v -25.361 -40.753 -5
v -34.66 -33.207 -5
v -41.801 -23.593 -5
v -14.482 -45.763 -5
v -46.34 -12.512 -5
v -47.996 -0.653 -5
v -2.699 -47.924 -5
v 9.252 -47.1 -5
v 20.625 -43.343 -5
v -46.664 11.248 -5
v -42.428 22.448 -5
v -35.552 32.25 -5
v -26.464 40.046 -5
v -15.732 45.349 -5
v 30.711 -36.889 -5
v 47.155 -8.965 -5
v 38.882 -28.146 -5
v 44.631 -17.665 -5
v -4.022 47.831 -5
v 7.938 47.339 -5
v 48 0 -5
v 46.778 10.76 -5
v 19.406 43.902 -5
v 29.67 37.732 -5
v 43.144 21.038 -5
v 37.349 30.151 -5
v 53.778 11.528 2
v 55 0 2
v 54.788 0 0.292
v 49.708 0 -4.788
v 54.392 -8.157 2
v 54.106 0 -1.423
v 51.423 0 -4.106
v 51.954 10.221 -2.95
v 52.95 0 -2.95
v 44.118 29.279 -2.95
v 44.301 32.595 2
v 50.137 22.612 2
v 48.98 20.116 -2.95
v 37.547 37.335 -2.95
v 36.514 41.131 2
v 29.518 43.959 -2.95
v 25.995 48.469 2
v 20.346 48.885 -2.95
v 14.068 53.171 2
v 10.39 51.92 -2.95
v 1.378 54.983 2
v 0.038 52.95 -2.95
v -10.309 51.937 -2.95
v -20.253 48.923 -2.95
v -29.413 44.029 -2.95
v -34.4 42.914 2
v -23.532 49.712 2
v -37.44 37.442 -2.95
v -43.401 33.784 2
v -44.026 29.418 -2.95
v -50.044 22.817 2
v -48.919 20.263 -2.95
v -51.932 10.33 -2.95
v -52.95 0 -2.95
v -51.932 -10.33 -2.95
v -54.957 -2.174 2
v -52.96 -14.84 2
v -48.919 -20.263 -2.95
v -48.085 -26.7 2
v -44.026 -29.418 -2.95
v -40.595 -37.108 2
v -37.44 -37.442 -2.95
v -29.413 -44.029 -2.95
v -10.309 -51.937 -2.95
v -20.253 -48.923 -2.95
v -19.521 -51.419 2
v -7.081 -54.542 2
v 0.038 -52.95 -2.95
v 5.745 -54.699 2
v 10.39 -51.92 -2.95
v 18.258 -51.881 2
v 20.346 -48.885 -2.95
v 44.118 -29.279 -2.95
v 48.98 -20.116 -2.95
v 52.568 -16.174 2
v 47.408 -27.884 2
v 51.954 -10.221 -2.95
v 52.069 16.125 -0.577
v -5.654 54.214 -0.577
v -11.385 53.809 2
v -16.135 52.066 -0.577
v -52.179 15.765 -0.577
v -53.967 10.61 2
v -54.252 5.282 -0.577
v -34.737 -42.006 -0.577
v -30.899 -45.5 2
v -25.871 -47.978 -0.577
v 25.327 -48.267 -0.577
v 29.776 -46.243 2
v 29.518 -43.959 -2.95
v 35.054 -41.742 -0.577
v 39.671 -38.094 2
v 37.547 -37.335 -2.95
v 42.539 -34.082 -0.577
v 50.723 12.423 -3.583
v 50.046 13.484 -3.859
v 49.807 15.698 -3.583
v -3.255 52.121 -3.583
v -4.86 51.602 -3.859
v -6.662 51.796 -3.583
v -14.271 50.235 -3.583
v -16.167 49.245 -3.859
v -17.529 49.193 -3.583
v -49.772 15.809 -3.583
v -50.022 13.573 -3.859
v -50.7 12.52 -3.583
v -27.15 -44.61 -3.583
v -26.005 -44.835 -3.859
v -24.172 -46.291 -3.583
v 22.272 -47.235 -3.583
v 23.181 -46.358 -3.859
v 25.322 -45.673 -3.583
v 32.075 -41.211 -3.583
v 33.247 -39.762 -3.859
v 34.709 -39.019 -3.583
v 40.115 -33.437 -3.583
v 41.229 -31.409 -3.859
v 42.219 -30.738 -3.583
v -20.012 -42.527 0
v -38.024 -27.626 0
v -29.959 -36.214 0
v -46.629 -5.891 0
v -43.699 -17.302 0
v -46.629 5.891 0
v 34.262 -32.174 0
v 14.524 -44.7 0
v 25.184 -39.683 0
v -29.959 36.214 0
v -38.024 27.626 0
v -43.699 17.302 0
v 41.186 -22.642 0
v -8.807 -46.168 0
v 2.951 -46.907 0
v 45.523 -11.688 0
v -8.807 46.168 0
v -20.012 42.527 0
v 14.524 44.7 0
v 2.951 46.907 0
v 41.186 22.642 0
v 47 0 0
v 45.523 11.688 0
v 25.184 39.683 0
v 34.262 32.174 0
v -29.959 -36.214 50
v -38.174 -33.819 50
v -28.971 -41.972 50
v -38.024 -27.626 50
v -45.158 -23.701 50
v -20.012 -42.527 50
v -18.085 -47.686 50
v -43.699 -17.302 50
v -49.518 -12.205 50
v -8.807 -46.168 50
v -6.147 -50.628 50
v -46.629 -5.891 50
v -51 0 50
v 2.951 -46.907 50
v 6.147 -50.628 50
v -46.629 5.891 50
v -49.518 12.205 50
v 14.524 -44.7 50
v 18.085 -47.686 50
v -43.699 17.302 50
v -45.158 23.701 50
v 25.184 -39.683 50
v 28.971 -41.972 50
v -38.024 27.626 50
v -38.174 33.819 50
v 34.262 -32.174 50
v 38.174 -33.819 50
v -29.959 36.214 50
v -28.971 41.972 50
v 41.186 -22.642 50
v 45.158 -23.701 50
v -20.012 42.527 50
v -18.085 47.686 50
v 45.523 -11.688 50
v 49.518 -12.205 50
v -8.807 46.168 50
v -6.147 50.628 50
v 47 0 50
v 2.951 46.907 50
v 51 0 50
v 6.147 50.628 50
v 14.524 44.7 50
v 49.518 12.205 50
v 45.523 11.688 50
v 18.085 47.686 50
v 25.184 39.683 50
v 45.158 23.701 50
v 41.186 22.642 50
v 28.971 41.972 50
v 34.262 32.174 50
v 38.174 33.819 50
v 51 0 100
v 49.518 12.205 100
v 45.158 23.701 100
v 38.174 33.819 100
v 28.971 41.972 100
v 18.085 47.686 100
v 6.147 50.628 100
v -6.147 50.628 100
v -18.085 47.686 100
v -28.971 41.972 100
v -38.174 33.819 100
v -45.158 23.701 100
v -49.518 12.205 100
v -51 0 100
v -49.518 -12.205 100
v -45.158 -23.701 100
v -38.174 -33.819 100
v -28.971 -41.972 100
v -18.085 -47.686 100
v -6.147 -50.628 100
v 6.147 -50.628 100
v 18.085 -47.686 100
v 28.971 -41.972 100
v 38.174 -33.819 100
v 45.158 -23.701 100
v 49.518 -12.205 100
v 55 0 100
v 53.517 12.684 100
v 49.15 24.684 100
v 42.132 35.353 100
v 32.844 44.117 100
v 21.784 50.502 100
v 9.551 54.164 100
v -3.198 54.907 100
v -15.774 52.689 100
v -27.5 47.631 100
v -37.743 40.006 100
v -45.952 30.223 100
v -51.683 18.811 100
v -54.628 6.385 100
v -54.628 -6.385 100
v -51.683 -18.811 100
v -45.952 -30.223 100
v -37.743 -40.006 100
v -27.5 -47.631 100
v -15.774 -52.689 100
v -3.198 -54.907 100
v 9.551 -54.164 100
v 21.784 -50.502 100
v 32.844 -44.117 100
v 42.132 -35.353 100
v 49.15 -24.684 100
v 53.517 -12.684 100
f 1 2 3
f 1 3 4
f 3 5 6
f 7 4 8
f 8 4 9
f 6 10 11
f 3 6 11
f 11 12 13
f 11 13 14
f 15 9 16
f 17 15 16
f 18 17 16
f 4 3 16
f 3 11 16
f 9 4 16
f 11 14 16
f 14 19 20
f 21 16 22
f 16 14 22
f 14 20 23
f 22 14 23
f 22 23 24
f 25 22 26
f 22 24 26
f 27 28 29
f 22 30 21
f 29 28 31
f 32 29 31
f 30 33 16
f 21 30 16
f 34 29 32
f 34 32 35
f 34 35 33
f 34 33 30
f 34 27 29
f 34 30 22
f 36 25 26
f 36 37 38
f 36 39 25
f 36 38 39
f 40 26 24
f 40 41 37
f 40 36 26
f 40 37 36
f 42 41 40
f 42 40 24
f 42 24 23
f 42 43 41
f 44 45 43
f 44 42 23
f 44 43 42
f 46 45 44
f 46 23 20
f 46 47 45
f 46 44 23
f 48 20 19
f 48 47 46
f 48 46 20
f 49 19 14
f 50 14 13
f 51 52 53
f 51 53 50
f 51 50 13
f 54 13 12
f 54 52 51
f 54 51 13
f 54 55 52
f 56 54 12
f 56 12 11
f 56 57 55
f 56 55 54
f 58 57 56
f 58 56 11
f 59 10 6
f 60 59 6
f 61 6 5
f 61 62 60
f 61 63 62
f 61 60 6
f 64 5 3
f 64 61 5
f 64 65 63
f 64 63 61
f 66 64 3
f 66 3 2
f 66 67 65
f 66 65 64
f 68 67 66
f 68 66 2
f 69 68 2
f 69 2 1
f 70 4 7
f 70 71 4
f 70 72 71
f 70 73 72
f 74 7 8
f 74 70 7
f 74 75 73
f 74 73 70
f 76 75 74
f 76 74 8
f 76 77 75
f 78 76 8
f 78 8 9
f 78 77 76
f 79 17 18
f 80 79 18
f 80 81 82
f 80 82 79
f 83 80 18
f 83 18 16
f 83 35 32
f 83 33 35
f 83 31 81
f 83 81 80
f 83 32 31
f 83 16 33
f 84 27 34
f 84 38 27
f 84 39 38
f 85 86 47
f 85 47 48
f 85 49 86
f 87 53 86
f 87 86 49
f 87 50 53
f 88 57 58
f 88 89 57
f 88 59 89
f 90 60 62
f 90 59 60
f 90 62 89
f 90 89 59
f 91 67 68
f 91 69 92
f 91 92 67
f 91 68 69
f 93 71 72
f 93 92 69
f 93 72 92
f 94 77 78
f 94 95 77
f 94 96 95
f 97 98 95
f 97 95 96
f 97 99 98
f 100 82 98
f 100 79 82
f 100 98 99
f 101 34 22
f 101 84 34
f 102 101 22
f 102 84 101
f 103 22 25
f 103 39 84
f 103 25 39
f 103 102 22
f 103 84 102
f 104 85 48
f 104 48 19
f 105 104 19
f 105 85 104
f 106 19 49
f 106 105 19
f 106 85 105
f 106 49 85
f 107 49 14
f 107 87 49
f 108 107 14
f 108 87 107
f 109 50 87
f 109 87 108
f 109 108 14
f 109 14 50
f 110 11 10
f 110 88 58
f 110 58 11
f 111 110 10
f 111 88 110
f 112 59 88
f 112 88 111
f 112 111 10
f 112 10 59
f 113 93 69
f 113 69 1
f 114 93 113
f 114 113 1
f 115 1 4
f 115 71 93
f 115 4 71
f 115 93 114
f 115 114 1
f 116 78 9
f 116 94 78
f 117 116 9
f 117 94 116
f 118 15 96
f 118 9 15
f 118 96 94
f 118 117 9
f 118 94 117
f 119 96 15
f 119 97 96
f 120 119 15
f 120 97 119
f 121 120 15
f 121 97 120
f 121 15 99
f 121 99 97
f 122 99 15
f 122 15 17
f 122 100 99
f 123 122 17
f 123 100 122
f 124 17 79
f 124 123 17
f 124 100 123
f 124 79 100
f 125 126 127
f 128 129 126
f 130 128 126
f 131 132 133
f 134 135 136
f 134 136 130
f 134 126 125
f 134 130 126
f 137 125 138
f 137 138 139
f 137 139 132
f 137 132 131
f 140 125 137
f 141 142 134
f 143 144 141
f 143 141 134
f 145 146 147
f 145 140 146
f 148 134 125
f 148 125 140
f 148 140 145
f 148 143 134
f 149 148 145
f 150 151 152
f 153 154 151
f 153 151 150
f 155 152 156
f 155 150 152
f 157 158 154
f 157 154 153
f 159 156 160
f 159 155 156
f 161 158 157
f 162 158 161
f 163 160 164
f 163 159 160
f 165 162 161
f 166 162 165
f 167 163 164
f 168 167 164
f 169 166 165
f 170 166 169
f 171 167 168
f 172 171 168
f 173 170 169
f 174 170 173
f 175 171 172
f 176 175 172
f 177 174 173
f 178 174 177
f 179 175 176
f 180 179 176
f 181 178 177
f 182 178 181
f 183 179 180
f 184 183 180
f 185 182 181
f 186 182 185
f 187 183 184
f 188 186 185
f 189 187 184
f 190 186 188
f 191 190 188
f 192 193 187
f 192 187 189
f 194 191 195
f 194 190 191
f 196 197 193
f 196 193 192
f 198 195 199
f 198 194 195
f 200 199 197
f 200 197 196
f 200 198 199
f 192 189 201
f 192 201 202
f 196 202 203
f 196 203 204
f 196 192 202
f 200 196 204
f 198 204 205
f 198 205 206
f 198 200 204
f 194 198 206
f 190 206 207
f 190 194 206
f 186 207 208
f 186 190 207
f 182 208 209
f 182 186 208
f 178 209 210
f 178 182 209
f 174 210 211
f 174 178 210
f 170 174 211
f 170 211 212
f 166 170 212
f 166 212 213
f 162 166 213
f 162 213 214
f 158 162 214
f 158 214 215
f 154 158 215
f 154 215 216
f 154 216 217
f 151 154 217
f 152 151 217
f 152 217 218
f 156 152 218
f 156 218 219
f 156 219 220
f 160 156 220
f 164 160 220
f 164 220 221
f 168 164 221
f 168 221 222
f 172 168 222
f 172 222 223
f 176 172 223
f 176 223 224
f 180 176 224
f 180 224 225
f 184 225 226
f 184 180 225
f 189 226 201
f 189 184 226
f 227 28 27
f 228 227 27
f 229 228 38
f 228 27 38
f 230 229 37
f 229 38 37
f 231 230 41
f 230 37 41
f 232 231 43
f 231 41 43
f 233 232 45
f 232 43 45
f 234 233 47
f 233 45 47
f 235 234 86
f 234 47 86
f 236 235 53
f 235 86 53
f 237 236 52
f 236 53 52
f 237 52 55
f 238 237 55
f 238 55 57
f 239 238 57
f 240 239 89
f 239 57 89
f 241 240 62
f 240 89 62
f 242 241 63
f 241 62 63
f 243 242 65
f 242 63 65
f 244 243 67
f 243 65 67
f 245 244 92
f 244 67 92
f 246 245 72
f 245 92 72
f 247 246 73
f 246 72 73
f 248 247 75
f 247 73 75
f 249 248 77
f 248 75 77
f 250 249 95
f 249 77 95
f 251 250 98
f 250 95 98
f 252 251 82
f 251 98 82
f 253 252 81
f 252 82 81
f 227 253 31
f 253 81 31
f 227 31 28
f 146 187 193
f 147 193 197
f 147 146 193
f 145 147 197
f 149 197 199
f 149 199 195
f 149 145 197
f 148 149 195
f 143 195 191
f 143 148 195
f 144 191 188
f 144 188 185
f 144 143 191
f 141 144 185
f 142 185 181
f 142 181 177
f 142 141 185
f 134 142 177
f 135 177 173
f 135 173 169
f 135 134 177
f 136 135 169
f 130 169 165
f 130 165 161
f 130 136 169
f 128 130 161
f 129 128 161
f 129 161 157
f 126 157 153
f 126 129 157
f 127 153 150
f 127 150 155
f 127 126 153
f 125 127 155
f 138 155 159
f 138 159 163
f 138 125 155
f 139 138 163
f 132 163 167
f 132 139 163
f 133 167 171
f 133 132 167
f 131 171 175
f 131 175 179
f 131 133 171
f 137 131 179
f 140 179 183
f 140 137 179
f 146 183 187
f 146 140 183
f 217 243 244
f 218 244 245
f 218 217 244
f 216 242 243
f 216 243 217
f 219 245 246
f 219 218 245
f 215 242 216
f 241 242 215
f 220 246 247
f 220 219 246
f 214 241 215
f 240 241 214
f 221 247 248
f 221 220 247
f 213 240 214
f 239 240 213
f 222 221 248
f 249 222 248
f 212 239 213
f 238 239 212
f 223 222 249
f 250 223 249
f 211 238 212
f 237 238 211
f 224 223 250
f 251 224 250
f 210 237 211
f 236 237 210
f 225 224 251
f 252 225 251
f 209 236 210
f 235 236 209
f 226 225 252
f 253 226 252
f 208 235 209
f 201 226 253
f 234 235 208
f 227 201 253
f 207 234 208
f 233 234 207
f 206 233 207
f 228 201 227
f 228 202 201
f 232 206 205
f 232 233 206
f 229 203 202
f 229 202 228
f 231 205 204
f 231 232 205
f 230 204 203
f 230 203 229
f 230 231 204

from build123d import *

# Parameters (mm, degrees)
F0_R     = 55
F0_R_2   = 51
F0_R_3   = 47
F1_DEPTH = 5
F2_DEPTH = 50
F3_DEPTH = 100
F4_R     = 7


with BuildPart() as f1:
    # F0 (on Top) → F1 (new body)
    with BuildSketch(Plane.XY):
        Circle(F0_R)
        Circle(F0_R_2, mode=Mode.SUBTRACT)
        Circle(F0_R_2)
        Circle(F0_R_3, mode=Mode.SUBTRACT)
        Circle(F0_R_3)
    extrude(amount=-F1_DEPTH)

    # F0 (on Top) → F2 (join)
    with BuildSketch(Plane.XY):
        Circle(F0_R_2)
        Circle(F0_R_3, mode=Mode.SUBTRACT)
    extrude(amount=F2_DEPTH)

    # F0 (on Top) → F3 (join)
    with BuildSketch(Plane.XY):
        Circle(F0_R)
        Circle(F0_R_2, mode=Mode.SUBTRACT)
    extrude(amount=F3_DEPTH)

    # F4
    f4_edges = [f1.edges().sort_by_distance(p)[0] for p in [
        (-55, 0, -5),
    ]]
    fillet(f4_edges, radius=F4_R)


solid = f1.part
